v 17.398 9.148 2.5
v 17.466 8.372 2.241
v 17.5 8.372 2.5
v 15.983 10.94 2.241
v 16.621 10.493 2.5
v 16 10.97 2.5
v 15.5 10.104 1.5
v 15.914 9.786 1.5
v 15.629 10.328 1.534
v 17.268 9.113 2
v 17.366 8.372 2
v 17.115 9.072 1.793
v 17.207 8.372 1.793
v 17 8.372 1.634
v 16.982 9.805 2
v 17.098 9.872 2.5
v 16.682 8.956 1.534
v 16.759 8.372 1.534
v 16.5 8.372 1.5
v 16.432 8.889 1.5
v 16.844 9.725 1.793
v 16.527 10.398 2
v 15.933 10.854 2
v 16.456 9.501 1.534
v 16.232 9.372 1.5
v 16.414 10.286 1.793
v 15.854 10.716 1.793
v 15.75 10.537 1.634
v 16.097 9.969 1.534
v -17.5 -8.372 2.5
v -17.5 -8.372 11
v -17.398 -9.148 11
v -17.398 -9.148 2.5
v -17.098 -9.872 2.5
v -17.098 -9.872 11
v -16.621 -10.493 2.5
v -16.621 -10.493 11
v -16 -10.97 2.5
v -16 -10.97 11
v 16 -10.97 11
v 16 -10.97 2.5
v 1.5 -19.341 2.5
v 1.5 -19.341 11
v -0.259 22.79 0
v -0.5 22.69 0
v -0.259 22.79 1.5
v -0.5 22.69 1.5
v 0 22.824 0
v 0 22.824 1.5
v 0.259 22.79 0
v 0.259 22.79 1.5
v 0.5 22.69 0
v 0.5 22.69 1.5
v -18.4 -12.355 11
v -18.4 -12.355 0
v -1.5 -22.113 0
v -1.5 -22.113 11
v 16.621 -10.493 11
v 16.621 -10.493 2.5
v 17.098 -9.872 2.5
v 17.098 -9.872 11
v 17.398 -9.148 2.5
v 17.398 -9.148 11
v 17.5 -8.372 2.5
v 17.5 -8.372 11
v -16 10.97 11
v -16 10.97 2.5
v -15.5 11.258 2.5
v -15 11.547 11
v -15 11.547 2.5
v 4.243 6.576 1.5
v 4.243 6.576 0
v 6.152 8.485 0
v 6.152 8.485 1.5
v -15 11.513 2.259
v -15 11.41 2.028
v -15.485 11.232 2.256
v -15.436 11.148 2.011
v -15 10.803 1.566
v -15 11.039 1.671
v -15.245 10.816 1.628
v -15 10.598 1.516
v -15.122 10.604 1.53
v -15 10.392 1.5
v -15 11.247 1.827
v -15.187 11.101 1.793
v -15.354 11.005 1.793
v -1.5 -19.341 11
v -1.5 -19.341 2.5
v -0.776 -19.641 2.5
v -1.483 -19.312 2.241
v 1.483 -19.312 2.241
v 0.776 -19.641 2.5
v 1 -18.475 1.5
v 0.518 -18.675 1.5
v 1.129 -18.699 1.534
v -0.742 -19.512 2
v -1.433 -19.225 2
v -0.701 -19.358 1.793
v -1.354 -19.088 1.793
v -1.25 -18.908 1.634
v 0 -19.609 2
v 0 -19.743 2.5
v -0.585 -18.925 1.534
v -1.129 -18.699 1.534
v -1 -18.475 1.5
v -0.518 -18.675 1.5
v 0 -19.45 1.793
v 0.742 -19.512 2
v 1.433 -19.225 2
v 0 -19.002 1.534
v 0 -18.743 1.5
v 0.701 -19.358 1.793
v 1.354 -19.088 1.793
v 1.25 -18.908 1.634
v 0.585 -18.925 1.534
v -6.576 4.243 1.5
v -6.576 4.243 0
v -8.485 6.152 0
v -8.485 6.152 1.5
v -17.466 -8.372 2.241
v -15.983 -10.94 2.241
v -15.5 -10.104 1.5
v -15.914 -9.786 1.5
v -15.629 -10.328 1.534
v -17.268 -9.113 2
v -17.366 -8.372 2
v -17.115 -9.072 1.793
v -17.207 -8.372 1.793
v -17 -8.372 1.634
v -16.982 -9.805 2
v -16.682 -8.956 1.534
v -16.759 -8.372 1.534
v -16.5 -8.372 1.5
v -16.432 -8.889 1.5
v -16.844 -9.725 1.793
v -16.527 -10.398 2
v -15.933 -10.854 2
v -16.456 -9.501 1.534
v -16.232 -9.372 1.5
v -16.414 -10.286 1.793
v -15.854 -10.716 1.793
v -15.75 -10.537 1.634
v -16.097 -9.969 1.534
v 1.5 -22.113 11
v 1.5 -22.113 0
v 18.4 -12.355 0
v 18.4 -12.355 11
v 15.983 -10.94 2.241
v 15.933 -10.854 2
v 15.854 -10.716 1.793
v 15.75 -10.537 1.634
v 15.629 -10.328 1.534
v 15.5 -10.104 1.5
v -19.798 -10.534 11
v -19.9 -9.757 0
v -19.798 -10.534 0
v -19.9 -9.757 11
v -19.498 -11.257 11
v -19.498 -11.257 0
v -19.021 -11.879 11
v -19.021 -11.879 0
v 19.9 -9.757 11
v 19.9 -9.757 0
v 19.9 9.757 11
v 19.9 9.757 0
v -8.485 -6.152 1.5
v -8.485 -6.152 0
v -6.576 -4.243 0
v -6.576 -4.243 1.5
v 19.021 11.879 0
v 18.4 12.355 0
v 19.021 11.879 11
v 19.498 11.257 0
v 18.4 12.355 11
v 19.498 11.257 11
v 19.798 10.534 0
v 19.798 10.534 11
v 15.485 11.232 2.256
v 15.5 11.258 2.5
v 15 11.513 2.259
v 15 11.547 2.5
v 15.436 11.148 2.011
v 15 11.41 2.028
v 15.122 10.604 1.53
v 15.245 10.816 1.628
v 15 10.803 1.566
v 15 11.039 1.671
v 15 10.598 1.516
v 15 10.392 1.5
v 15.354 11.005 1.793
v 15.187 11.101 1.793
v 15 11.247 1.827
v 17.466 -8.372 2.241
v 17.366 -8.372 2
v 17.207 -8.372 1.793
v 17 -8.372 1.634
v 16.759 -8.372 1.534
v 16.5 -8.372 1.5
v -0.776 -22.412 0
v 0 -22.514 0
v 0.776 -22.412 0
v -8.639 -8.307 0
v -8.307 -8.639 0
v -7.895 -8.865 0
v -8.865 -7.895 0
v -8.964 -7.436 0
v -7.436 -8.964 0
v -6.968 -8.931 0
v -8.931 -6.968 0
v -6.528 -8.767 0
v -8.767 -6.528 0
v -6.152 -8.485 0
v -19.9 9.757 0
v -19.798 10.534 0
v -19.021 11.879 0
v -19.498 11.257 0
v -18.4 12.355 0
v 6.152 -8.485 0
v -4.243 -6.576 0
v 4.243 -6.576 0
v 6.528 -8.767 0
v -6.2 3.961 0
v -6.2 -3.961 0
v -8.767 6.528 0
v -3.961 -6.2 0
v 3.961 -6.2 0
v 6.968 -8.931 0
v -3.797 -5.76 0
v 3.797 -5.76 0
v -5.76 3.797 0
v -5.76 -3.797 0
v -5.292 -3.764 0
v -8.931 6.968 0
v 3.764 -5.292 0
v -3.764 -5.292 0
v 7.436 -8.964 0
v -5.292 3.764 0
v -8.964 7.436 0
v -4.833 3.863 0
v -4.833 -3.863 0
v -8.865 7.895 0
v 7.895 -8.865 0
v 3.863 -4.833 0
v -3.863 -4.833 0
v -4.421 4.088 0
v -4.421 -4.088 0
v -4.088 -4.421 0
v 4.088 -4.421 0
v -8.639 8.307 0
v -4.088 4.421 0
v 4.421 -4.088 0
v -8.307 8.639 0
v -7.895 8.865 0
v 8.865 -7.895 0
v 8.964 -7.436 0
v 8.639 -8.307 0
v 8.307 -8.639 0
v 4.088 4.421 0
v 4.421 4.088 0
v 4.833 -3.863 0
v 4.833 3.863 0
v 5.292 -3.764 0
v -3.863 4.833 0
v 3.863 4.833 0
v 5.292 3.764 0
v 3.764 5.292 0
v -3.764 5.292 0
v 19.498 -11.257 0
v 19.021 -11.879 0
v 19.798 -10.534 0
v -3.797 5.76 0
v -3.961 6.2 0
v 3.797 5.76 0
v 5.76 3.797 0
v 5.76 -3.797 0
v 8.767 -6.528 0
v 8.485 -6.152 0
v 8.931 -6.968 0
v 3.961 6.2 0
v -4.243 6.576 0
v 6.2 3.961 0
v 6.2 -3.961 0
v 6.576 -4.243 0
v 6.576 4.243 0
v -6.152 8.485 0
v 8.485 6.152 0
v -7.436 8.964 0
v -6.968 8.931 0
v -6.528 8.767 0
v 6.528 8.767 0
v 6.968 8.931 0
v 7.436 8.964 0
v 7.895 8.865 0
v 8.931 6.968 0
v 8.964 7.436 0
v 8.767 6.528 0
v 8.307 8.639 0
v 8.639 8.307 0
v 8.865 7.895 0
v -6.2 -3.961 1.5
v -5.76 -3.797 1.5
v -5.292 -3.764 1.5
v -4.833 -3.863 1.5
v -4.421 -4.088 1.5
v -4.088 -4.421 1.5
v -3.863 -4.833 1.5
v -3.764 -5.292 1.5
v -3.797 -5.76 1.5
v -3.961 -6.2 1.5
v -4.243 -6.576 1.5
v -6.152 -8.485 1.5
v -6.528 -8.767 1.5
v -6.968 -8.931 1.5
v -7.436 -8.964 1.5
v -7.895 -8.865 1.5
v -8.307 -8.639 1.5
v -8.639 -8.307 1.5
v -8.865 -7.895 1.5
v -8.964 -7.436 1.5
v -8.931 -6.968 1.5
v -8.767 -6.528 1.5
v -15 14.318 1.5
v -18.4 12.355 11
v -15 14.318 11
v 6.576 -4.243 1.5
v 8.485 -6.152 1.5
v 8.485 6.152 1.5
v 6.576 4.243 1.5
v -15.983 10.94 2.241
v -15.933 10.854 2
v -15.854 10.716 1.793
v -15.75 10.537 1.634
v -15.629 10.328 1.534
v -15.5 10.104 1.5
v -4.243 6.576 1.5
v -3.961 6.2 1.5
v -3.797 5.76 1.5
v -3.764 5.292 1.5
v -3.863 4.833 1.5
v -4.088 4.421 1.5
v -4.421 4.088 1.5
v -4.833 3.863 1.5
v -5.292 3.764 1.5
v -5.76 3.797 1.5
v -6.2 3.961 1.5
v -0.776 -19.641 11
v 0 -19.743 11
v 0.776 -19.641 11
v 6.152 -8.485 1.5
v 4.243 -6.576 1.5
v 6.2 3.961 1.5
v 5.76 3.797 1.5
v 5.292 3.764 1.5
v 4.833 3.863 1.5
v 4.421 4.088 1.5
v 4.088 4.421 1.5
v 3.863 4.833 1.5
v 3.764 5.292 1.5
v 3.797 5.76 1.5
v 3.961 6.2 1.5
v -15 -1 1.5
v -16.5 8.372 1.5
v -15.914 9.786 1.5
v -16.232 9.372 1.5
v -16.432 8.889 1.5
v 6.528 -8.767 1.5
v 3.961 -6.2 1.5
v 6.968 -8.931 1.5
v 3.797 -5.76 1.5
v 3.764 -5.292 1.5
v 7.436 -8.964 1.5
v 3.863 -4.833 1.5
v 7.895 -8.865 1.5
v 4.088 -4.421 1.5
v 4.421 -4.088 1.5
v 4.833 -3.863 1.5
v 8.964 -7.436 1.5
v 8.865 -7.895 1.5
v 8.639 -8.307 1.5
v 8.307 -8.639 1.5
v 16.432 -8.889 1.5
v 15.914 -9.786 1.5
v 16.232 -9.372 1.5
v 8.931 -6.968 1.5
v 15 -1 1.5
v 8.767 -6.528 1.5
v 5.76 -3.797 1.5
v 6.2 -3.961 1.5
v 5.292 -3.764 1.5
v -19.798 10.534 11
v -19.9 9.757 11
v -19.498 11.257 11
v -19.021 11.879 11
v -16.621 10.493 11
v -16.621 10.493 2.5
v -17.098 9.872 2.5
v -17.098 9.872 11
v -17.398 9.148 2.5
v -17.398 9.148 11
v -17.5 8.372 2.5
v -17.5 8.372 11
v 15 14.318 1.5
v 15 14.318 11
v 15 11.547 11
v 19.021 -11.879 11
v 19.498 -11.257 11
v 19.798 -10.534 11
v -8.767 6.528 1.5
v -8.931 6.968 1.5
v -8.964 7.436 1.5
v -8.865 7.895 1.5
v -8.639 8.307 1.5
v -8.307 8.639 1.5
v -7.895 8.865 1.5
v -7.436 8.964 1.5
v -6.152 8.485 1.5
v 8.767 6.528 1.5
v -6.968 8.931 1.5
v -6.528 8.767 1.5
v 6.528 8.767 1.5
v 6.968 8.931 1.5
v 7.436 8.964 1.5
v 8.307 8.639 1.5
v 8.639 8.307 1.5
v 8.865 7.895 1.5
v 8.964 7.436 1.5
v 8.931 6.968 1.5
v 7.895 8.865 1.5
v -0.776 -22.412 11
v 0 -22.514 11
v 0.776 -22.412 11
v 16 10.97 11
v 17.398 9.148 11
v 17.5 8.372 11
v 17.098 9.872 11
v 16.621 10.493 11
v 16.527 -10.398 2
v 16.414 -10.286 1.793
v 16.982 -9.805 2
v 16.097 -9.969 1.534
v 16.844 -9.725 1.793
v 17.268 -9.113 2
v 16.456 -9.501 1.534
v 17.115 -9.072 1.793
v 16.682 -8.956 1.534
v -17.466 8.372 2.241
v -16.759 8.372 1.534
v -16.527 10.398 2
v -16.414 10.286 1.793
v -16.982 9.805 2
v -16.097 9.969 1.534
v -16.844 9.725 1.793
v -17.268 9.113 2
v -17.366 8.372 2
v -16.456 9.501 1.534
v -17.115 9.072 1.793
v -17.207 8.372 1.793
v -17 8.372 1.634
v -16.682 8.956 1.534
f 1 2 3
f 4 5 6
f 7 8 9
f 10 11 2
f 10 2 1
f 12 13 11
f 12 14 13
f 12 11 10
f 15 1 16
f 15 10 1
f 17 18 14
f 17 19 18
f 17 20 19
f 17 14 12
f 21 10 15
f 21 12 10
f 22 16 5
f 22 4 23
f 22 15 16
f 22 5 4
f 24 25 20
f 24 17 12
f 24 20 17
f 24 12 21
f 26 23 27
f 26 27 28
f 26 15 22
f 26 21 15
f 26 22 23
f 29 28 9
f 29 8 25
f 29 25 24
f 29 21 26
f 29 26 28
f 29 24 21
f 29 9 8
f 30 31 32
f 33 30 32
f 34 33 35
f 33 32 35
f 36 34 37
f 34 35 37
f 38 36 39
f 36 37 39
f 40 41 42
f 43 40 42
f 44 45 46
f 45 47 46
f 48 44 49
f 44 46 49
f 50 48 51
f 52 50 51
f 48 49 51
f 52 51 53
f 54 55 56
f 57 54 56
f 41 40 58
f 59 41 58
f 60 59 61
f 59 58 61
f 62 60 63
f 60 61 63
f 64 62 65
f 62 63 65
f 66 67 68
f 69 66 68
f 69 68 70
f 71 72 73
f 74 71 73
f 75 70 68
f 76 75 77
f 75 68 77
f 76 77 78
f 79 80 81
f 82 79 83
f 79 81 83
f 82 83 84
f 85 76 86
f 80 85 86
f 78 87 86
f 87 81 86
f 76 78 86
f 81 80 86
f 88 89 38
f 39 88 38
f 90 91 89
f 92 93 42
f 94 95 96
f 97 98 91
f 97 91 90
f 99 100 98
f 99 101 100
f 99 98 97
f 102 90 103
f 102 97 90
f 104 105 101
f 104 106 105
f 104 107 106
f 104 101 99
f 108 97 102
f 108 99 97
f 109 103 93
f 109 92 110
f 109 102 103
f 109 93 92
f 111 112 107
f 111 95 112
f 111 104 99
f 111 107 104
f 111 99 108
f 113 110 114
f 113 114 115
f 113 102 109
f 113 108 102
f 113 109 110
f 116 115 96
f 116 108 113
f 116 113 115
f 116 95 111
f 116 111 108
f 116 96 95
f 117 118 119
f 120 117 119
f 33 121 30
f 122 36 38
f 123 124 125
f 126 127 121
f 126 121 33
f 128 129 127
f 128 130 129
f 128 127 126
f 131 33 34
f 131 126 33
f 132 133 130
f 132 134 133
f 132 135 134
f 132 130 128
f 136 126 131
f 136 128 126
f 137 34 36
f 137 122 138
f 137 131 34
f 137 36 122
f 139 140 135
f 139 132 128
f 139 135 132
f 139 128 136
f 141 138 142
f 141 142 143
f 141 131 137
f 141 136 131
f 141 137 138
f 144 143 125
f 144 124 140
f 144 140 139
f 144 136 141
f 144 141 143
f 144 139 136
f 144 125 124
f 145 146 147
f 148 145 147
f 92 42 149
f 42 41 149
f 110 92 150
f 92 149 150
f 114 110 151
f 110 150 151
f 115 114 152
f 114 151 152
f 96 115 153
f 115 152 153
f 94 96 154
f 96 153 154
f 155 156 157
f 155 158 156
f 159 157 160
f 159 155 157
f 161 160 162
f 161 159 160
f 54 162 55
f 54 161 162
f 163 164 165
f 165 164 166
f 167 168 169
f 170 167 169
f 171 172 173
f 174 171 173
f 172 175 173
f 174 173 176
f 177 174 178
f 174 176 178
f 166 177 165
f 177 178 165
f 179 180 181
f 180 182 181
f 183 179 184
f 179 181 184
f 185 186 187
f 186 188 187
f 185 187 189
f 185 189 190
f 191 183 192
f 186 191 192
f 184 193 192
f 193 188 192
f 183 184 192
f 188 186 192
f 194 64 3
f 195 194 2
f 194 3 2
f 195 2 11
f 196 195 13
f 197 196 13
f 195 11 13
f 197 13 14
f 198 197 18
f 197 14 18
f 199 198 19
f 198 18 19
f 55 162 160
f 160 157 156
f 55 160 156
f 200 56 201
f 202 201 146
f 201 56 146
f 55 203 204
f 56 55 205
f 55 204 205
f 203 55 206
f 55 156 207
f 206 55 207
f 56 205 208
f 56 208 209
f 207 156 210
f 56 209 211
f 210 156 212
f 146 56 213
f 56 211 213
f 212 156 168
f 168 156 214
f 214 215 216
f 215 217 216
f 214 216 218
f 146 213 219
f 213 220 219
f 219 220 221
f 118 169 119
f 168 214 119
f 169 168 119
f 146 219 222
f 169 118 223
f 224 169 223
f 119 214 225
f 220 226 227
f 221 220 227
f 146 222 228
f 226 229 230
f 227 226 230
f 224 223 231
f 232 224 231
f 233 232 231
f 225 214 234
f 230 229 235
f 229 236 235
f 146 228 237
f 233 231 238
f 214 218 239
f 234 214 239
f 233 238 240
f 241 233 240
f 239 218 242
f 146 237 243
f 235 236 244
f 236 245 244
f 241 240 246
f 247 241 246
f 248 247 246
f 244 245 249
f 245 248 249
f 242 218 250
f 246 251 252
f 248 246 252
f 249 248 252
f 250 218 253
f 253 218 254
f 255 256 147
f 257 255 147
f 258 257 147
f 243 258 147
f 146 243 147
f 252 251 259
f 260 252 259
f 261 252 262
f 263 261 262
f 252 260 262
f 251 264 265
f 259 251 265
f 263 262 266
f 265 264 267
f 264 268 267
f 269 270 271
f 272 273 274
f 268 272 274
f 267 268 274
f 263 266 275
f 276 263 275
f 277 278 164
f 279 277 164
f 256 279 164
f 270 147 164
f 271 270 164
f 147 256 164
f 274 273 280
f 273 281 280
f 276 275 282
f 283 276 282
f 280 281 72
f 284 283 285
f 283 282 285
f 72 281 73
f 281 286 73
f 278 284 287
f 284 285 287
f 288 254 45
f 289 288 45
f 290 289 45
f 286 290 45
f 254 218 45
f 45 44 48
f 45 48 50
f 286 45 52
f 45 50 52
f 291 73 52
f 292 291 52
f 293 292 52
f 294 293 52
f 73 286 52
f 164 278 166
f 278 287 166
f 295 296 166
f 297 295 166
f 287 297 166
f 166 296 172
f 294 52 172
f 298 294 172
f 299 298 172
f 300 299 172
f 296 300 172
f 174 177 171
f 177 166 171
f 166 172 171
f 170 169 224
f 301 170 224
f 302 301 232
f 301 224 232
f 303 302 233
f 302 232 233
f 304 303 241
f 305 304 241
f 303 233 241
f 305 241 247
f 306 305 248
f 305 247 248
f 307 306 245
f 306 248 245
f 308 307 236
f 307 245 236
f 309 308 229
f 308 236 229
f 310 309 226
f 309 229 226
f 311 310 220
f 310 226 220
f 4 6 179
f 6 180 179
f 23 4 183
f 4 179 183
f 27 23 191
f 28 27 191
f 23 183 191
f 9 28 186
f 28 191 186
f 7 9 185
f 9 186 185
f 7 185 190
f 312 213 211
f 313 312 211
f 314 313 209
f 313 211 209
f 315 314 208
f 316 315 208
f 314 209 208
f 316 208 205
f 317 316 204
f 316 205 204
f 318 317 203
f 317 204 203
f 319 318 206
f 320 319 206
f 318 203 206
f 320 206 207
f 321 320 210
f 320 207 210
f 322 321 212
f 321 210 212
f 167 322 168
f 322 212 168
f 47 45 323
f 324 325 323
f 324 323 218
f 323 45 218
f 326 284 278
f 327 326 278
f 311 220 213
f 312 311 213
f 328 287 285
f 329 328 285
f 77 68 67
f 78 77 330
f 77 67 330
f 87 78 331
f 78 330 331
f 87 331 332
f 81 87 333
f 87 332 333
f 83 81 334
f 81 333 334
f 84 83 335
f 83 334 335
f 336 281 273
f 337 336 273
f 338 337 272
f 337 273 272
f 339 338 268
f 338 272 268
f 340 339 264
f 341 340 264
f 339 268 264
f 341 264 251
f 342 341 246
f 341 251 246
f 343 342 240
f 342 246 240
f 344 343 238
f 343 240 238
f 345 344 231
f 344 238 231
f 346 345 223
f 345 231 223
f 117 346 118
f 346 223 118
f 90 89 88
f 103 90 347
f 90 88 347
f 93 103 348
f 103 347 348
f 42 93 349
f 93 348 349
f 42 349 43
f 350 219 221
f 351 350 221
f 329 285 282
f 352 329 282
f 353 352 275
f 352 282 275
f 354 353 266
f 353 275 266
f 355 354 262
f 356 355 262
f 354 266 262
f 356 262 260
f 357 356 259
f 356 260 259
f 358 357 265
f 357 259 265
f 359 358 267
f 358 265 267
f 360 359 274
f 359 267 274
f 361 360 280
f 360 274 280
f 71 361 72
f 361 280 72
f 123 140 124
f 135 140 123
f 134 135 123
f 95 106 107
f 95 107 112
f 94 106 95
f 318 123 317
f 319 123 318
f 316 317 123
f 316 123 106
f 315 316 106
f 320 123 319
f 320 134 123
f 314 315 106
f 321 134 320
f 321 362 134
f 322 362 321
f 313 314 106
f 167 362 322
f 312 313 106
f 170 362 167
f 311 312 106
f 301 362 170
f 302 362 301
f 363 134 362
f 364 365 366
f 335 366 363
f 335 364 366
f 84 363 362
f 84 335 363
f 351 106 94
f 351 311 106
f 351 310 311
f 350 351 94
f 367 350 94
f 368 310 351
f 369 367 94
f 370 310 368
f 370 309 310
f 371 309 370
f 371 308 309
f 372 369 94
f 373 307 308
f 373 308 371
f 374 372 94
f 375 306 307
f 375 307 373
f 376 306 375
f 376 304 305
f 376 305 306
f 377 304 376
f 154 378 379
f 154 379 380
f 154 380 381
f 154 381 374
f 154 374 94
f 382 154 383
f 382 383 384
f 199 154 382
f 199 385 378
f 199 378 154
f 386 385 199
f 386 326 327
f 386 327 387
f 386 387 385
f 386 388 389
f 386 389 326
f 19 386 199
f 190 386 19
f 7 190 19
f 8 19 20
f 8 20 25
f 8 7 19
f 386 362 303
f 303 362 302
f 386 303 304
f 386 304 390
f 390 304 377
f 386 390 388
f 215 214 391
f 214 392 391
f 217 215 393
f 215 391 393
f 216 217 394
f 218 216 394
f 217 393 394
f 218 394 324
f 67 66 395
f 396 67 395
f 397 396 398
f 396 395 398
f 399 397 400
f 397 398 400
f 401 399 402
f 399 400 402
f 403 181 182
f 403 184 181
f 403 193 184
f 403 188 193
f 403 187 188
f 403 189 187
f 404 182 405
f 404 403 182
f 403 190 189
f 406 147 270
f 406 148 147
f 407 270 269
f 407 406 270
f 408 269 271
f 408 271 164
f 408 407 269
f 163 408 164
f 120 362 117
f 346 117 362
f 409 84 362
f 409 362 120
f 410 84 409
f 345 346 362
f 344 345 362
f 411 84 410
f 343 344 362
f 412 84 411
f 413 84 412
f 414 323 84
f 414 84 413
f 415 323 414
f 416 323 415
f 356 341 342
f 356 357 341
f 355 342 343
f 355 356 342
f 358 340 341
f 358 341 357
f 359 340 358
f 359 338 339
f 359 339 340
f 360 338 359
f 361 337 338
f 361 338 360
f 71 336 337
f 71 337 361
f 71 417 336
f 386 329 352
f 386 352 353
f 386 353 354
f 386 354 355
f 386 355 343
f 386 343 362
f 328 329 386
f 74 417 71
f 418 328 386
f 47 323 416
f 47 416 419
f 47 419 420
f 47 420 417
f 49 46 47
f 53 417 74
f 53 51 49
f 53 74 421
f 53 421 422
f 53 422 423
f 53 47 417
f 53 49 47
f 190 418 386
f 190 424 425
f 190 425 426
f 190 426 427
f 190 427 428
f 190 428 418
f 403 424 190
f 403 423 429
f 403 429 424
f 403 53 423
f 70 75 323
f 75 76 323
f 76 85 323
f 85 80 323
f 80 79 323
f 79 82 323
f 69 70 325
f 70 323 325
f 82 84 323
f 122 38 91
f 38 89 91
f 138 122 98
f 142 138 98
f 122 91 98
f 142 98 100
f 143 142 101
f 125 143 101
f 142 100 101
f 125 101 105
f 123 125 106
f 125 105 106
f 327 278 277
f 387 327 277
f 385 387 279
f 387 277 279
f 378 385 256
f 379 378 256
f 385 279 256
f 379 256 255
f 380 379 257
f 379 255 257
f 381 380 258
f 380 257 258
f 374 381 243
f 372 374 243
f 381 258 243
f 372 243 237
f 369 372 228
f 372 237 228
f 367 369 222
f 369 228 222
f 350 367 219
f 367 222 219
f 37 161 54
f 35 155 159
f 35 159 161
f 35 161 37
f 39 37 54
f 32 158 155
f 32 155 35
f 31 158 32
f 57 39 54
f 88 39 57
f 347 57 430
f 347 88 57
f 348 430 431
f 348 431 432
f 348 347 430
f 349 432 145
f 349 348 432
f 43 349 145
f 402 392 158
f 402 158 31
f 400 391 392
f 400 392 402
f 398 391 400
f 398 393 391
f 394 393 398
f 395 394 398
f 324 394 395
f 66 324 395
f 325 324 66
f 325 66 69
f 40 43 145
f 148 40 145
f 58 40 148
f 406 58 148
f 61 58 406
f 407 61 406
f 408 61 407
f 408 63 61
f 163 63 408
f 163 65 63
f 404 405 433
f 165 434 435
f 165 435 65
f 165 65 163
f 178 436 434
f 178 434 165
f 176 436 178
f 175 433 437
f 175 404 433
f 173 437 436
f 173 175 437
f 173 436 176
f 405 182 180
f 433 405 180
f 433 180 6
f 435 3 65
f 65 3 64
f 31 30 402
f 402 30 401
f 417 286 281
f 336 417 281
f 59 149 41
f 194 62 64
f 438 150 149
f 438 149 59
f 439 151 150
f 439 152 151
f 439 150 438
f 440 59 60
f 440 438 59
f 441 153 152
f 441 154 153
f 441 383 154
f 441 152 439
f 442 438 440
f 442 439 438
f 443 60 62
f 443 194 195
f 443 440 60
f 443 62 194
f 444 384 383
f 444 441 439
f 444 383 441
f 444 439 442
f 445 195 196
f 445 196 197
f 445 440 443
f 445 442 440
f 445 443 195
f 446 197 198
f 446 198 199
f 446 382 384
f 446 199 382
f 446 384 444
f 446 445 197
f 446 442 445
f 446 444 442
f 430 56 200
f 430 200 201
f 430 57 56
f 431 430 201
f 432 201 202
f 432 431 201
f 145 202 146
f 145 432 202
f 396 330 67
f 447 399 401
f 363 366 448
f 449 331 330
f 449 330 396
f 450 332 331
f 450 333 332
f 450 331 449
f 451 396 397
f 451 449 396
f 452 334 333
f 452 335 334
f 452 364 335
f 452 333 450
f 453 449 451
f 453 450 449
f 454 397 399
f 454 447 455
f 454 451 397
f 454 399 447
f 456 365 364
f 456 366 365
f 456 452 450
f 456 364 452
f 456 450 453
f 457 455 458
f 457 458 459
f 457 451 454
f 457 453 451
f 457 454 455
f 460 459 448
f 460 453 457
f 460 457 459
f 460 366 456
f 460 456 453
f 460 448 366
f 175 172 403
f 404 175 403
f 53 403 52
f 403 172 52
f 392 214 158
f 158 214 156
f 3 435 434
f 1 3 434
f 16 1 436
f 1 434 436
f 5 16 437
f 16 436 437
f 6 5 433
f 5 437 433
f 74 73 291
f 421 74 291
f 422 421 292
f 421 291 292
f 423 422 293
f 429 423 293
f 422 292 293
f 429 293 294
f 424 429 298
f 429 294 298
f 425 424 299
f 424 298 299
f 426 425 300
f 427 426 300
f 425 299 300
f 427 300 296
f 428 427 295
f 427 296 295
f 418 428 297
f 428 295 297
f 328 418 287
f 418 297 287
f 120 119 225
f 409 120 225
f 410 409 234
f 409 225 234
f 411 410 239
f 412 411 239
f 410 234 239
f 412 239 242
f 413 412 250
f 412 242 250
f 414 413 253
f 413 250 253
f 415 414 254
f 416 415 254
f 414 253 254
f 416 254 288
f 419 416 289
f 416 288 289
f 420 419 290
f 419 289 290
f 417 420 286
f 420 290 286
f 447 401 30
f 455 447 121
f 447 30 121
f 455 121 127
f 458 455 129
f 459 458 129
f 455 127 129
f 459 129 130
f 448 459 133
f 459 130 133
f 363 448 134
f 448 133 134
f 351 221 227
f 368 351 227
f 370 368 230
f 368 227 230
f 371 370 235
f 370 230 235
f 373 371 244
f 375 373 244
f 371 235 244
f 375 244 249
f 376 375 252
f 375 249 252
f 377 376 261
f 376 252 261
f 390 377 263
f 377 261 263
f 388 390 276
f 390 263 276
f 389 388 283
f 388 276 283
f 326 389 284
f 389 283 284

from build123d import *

# Parameters (mm, degrees)
F1_DEPTH = 1.5
F2_DEPTH = 11
F4_W     = 30
F4_H     = 11.070783
F5_DEPTH = 26
F6_R     = 3
F7_R     = 1


with BuildPart() as f1:
    # F0 (on Top) → F1 (new body)
    with BuildSketch(Plane.XY):
        Polygon((0, -20.207259), (17.5, -10.10363), (17.5, 10.10363), (0, 20.207259), (-17.5, 10.10363), (-17.5, -10.10363), align=None)
        with BuildLine():
            ThreePointArc((-6.151829, -8.485281), (-8.485281, -8.485281), (-8.485281, -6.151829))
            Line((-8.485281, -6.151829), (-6.576093, -4.242641))
            ThreePointArc((-6.576093, -4.242641), (-4.242641, -4.242641), (-4.242641, -6.576093))
            Line((-4.242641, -6.576093), (-6.151829, -8.485281))
        make_face(mode=Mode.SUBTRACT)
        with BuildLine():
            ThreePointArc((8.485281, -6.151829), (8.485281, -8.485281), (6.151829, -8.485281))
            Line((6.151829, -8.485281), (4.242641, -6.576093))
            ThreePointArc((4.242641, -6.576093), (4.242641, -4.242641), (6.576093, -4.242641))
            Line((6.576093, -4.242641), (8.485281, -6.151829))
        make_face(mode=Mode.SUBTRACT)
        with BuildLine():
            ThreePointArc((-8.485281, 6.151829), (-8.485281, 8.485281), (-6.151829, 8.485281))
            Line((-6.151829, 8.485281), (-4.242641, 6.576093))
            ThreePointArc((-4.242641, 6.576093), (-4.242641, 4.242641), (-6.576093, 4.242641))
            Line((-6.576093, 4.242641), (-8.485281, 6.151829))
        make_face(mode=Mode.SUBTRACT)
        with BuildLine():
            Line((4.242641, 6.576093), (6.151829, 8.485281))
            ThreePointArc((6.151829, 8.485281), (8.485281, 8.485281), (8.485281, 6.151829))
            Line((8.485281, 6.151829), (6.576093, 4.242641))
            ThreePointArc((6.576093, 4.242641), (4.242641, 4.242641), (4.242641, 6.576093))
        make_face(mode=Mode.SUBTRACT)
    extrude(amount=F1_DEPTH)

    # F0 (on Top) → F2 (join)
    with BuildSketch(Plane.XY):
        Polygon((-19.9, 11.48927), (-19.9, -11.48927), (0, -22.978541), (19.9, -11.48927), (19.9, 11.48927), (0, 22.978541), align=None)
        Polygon((17.5, 10.10363), (17.5, -10.10363), (0, -20.207259), (-17.5, -10.10363), (-17.5, 10.10363), (0, 20.207259), align=None, mode=Mode.SUBTRACT)
    extrude(amount=F2_DEPTH)

    # F4 (on offset) → F5 (cut)
    with BuildSketch(Plane.XZ.offset(-25)):
        with Locations((0, 7.035391)):
            Rectangle(F4_W, F4_H)
    extrude(amount=F5_DEPTH, mode=Mode.SUBTRACT)

    # F6
    f6_edges = [f1.edges().sort_by_distance(p)[0] for p in [
        (19.9, 11.48927, 5.5),
        (-19.9, 11.48927, 5.5),
        (-19.9, -11.48927, 5.5),
        (0, -22.978541, 5.5),
        (19.9, -11.48927, 5.5),
        (17.5, 10.10363, 6.25),
        (17.5, -10.10363, 6.25),
        (0, -20.207259, 6.25),
        (-17.5, -10.10363, 6.25),
        (-17.5, 10.10363, 6.25),
    ]]
    fillet(f6_edges, radius=F6_R)

    # F7
    f7_edges = [f1.edges().sort_by_distance(p)[0] for p in [
        (-15.5, 11.25833, 1.5),
        (0, 22.978541, 0.75),
    ]]
    fillet(f7_edges, radius=F7_R)


solid = f1.part
